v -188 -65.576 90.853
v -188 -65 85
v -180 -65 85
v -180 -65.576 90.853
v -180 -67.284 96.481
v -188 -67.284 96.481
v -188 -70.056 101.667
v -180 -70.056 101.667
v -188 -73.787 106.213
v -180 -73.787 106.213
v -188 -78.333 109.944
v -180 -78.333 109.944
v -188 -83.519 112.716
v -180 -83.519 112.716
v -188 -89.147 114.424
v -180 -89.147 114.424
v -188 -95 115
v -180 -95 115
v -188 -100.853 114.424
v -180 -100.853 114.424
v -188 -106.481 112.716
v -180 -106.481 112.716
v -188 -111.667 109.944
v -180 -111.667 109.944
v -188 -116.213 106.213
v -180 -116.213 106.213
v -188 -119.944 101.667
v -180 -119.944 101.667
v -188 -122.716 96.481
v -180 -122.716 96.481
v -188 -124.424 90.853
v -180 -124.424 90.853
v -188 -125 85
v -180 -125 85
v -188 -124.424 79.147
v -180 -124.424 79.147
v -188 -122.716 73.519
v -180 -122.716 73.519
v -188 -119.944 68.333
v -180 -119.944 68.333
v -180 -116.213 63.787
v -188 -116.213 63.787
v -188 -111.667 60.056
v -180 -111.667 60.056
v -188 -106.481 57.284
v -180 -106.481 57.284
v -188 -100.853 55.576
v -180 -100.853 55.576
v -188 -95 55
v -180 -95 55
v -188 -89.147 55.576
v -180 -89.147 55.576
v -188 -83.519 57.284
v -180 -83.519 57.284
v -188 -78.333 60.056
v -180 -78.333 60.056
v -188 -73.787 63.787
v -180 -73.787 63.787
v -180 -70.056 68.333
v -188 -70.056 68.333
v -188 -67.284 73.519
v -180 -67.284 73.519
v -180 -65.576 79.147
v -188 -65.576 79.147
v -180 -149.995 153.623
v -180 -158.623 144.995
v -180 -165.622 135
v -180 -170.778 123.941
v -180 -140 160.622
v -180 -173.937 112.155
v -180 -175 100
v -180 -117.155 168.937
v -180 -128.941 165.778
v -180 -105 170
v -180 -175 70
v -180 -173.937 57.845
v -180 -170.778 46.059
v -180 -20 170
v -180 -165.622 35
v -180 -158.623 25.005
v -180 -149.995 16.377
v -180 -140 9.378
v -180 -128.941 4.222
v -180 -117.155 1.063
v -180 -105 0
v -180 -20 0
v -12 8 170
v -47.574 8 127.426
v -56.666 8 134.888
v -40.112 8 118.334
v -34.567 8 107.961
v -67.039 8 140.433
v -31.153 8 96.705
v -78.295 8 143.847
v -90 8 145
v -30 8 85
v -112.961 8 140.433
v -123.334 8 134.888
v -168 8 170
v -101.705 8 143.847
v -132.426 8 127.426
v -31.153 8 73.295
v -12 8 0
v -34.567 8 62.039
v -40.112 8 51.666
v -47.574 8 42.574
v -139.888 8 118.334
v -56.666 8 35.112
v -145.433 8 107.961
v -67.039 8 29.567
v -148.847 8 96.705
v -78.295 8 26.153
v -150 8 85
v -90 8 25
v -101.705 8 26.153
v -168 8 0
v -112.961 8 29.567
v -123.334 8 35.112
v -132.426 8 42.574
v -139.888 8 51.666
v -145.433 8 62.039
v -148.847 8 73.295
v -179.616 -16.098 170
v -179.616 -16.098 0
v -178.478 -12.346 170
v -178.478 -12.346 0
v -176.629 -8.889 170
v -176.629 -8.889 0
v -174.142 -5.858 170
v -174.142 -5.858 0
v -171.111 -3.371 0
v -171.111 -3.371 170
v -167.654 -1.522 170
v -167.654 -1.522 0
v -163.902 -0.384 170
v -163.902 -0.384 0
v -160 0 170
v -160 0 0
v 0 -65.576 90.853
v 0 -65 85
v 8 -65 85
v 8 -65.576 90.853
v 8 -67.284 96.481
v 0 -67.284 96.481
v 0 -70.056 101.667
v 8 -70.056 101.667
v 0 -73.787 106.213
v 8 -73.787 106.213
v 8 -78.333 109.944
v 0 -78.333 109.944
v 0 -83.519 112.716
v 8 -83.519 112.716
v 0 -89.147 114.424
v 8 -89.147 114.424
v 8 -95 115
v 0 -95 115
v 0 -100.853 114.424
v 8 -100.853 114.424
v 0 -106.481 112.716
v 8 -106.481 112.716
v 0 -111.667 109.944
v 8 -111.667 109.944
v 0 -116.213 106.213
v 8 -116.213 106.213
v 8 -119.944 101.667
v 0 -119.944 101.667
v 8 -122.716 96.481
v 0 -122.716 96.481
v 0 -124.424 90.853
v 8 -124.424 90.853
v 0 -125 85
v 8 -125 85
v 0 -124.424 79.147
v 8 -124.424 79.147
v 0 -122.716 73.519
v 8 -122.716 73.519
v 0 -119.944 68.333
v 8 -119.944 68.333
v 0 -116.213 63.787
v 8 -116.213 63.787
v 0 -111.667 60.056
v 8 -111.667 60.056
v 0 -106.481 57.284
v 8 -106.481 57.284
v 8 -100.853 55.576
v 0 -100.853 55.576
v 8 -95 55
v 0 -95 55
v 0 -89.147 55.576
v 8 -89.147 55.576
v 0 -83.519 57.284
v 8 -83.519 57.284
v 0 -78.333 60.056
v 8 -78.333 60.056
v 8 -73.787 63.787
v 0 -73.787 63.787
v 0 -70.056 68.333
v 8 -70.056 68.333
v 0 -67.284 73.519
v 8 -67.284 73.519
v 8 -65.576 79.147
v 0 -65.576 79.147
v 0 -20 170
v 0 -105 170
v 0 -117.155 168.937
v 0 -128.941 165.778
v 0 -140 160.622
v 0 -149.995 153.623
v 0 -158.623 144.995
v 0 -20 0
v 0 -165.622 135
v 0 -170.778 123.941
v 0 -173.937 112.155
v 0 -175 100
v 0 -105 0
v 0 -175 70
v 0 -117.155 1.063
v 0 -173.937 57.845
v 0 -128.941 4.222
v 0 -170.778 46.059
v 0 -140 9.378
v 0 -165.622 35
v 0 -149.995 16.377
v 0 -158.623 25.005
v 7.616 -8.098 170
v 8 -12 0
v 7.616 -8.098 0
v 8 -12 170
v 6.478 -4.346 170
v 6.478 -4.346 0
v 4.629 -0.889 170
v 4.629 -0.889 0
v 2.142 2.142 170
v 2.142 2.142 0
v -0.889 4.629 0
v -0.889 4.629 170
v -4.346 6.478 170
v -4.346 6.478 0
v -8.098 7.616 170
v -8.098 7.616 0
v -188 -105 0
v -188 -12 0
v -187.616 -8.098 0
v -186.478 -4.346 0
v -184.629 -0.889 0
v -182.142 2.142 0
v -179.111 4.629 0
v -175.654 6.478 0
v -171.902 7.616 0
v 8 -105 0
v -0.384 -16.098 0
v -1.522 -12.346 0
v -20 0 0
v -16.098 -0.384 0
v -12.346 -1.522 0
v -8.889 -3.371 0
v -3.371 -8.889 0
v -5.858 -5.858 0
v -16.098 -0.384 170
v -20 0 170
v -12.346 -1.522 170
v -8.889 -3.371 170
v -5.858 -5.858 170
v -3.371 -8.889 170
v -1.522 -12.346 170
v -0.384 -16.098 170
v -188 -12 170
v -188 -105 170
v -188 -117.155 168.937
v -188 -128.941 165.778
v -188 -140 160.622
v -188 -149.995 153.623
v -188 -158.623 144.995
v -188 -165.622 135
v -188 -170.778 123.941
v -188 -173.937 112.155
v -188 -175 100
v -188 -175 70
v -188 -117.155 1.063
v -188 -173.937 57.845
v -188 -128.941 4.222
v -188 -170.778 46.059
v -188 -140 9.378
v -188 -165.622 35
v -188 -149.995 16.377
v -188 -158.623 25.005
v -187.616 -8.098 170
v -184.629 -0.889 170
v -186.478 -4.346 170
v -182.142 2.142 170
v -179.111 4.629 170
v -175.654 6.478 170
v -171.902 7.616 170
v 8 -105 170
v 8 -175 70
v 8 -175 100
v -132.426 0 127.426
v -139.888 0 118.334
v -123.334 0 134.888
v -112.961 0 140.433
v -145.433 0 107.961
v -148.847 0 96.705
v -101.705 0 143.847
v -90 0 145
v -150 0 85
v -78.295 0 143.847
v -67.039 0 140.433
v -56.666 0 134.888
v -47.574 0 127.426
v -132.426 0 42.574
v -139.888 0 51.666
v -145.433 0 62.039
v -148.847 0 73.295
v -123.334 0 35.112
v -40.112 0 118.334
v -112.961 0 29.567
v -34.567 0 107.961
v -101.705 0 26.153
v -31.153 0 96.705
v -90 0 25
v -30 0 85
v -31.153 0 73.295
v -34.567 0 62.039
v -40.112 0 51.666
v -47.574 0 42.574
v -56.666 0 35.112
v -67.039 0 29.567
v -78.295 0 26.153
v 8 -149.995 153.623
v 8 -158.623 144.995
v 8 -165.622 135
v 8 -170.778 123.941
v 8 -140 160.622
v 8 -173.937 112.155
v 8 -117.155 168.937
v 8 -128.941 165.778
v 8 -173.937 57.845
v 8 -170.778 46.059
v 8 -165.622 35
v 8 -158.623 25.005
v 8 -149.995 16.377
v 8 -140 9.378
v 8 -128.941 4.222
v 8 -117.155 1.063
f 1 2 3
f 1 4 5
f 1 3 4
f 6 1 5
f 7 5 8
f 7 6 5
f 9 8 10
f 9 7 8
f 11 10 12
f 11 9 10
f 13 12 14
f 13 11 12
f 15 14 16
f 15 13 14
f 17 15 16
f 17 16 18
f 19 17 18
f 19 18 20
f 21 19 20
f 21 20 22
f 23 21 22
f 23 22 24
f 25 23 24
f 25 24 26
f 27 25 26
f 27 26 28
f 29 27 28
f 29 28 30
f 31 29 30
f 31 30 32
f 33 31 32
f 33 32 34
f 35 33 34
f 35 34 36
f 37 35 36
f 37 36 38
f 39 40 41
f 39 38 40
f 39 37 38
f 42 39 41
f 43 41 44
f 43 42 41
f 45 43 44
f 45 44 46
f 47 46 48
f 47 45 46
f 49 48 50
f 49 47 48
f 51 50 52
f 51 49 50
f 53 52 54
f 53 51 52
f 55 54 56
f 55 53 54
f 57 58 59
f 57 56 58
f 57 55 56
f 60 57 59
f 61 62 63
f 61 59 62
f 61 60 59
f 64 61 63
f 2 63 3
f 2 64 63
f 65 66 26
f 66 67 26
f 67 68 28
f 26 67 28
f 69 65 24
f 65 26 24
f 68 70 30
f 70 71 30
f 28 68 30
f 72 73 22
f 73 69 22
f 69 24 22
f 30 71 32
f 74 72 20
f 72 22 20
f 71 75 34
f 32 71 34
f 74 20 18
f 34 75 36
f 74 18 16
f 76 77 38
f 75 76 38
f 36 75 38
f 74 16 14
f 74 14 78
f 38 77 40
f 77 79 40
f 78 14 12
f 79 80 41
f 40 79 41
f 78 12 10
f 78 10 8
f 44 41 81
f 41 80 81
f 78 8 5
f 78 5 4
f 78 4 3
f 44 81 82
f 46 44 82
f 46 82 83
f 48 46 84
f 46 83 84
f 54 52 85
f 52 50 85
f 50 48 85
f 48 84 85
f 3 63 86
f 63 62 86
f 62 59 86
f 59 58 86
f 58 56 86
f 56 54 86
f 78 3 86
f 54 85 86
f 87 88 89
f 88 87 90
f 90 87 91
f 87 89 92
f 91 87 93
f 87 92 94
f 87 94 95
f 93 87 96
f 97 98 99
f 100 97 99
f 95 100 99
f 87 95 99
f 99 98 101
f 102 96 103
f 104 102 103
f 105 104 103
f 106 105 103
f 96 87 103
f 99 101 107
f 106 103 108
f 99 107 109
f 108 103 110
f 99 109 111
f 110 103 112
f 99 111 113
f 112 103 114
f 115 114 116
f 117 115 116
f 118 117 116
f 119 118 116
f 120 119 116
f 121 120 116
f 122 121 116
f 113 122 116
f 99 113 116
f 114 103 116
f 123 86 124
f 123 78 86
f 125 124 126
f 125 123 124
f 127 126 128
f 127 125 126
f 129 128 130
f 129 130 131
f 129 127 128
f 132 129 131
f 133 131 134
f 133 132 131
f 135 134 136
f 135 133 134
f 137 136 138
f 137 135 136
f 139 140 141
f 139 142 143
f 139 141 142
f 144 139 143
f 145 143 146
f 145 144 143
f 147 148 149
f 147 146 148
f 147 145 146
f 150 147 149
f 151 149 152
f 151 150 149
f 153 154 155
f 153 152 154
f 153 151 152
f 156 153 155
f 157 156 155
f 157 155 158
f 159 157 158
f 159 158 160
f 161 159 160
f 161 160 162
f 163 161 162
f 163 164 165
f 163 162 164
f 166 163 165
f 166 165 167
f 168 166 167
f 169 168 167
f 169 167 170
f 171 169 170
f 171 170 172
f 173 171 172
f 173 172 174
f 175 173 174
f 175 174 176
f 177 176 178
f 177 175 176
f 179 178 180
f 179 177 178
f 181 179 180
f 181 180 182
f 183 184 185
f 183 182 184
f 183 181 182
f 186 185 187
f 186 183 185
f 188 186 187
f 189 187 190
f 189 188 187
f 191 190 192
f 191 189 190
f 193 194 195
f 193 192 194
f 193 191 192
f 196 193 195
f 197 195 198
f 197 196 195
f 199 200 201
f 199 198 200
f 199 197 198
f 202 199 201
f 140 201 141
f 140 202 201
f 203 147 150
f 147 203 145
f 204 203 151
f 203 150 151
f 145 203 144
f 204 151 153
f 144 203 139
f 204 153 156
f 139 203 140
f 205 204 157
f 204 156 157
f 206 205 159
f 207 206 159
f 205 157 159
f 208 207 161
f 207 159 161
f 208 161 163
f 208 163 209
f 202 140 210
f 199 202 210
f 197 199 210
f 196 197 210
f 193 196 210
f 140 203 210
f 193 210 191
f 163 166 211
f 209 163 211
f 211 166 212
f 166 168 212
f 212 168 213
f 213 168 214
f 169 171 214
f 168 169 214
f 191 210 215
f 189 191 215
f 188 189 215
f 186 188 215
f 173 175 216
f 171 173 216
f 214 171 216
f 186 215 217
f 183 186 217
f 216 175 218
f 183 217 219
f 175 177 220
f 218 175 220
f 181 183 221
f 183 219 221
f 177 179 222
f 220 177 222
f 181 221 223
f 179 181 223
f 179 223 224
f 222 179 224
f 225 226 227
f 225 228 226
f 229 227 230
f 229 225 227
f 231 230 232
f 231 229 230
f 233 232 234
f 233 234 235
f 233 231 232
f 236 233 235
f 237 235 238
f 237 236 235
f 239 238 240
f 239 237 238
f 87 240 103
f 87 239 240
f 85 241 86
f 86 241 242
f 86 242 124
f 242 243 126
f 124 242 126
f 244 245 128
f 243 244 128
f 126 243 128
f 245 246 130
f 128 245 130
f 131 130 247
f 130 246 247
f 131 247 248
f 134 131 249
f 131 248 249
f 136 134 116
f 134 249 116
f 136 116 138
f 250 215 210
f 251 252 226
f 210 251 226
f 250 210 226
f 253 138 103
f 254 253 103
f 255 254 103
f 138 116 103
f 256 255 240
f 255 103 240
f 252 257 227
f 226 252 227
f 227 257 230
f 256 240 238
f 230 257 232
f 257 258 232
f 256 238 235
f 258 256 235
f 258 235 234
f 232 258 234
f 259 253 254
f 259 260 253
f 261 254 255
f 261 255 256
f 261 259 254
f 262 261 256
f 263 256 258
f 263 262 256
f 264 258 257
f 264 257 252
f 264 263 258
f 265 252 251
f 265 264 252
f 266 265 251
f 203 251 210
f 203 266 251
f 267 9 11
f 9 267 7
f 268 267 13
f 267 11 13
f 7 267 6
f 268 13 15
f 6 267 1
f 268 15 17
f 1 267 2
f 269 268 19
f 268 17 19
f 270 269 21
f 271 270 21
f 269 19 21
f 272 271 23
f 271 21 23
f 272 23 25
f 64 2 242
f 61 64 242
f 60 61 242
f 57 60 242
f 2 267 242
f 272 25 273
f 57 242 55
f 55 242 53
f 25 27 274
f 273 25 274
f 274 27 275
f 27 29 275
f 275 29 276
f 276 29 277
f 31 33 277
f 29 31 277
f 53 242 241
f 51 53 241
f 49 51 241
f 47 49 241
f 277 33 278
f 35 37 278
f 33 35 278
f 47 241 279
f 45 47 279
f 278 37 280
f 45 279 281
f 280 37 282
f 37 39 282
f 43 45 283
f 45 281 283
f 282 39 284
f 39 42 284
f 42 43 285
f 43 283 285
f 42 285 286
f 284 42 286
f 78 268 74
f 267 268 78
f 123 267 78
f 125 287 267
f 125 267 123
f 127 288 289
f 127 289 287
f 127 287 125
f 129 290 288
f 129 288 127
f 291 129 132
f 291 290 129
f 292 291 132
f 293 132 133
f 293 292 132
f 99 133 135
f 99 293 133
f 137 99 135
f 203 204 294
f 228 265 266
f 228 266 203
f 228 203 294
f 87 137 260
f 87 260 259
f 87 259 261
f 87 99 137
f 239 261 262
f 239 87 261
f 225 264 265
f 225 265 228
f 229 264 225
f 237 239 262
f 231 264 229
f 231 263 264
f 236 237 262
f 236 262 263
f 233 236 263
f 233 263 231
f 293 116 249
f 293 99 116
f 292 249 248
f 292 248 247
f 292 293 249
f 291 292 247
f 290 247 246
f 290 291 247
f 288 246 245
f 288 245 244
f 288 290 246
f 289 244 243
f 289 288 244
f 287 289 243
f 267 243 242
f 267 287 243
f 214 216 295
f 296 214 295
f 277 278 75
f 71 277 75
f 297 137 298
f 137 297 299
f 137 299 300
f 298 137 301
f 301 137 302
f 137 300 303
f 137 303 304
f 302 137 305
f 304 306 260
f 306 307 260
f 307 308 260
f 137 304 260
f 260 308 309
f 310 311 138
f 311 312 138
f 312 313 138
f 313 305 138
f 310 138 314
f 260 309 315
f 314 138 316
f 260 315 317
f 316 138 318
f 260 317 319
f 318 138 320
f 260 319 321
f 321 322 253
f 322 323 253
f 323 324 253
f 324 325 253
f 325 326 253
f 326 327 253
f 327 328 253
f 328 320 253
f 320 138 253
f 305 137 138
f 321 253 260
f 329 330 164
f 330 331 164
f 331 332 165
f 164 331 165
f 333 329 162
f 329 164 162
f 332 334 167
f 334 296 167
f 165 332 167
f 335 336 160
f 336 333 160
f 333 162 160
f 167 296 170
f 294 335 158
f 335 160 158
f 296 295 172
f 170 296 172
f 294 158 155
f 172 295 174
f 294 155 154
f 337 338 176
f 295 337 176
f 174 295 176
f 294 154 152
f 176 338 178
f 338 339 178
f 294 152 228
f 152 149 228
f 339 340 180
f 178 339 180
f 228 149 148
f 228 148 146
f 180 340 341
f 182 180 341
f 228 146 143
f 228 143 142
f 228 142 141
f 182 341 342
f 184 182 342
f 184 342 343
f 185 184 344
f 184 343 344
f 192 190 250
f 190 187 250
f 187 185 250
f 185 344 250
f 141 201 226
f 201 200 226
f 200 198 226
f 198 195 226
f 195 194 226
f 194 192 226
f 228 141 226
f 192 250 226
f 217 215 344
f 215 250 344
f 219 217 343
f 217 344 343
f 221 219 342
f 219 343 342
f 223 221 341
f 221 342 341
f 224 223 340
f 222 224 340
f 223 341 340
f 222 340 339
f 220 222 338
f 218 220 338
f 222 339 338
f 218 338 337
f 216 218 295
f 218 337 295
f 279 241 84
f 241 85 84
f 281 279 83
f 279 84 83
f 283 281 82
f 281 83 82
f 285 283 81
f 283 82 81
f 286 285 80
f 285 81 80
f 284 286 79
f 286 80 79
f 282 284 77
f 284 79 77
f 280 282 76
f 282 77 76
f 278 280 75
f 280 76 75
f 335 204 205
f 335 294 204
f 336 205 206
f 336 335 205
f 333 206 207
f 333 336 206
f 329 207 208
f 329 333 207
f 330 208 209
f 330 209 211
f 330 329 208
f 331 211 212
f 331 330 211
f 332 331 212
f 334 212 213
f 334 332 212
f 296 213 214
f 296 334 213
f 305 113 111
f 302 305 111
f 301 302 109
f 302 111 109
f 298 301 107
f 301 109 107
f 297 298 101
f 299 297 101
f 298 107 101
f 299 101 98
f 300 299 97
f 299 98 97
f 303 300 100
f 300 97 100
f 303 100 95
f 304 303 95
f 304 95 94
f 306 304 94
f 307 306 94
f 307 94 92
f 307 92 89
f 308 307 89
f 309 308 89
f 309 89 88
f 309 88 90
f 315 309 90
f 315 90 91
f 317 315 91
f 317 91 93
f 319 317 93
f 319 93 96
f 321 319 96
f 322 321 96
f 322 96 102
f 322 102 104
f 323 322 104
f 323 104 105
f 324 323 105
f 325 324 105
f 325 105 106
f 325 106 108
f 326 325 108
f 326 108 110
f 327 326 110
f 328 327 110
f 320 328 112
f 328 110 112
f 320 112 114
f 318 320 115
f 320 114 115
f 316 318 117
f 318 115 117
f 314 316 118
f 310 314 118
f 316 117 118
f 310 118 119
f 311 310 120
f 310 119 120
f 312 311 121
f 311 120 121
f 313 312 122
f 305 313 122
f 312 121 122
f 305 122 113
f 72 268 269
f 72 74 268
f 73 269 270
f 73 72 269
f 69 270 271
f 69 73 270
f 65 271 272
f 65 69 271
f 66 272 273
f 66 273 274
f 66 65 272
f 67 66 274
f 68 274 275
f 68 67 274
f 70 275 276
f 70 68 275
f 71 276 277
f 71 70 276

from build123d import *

# Parameters (mm, degrees)
EXTRUDE_1_DEPTH          = 170
SKETCH_2_R               = 60
CUT_EXTRUDE_1_DEPTH      = 180
CUT_EXTRUDE_2_DEPTH      = 313.955268369
CUT_EXTRUDE_2_DEPTH_BACK = 313.955268369
SKETCH_3_R               = 30
FILLET_1_R               = 70
FILLET_2_R               = 20
FILLET_3_R               = 20


with BuildPart() as part:
    # 草图1 → 凸台-拉伸1 (new body)
    with BuildSketch(Plane.XY):
        Polygon((-180, 0), (0, 0), (0, -175), (8, -175), (8, 8), (-180, 8), (-188, 8), (-188, -175), (-180, -175), align=None)
    extrude(amount=EXTRUDE_1_DEPTH)

    # 草图2 → 切除-拉伸1 (cut)
    with BuildSketch(Plane(origin=(0, 8, 0), x_dir=(1, 0, 0), z_dir=(0, 1, 0))):
        with Locations(Location((-90, -85, 0), (0, 0, 180))):
            Circle(SKETCH_2_R)
    extrude(amount=-CUT_EXTRUDE_1_DEPTH, mode=Mode.SUBTRACT)

    # 草图3 → 切除-拉伸2 (cut, two sides: drawn at the far end of the back side and taken through both)
    with BuildSketch(Plane(origin=(8, 0, 0), x_dir=(0, 0, -1), z_dir=(1, 0, 0)).offset(-CUT_EXTRUDE_2_DEPTH_BACK)):
        with Locations(Location((-85, -95, 0), (0, 0, 90))):
            Circle(SKETCH_3_R)
    extrude(amount=CUT_EXTRUDE_2_DEPTH + CUT_EXTRUDE_2_DEPTH_BACK, mode=Mode.SUBTRACT)

    # 圆角1
    fillet_1_edges = [part.edges().sort_by_distance(p)[0] for p in [
        (4, -175, 0),
        (4, -175, 170),
        (-184, -175, 170),
        (-184, -175, 0),
    ]]
    fillet(fillet_1_edges, radius=FILLET_1_R)

    # 圆角2
    fillet_2_edges = [part.edges().sort_by_distance(p)[0] for p in [
        (0, 0, 85),
        (-180, 0, 85),
    ]]
    fillet(fillet_2_edges, radius=FILLET_2_R)

    # 圆角3
    fillet_3_edges = [part.edges().sort_by_distance(p)[0] for p in [
        (-188, 8, 85),
        (8, 8, 85),
    ]]
    fillet(fillet_3_edges, radius=FILLET_3_R)


solid = part.part
